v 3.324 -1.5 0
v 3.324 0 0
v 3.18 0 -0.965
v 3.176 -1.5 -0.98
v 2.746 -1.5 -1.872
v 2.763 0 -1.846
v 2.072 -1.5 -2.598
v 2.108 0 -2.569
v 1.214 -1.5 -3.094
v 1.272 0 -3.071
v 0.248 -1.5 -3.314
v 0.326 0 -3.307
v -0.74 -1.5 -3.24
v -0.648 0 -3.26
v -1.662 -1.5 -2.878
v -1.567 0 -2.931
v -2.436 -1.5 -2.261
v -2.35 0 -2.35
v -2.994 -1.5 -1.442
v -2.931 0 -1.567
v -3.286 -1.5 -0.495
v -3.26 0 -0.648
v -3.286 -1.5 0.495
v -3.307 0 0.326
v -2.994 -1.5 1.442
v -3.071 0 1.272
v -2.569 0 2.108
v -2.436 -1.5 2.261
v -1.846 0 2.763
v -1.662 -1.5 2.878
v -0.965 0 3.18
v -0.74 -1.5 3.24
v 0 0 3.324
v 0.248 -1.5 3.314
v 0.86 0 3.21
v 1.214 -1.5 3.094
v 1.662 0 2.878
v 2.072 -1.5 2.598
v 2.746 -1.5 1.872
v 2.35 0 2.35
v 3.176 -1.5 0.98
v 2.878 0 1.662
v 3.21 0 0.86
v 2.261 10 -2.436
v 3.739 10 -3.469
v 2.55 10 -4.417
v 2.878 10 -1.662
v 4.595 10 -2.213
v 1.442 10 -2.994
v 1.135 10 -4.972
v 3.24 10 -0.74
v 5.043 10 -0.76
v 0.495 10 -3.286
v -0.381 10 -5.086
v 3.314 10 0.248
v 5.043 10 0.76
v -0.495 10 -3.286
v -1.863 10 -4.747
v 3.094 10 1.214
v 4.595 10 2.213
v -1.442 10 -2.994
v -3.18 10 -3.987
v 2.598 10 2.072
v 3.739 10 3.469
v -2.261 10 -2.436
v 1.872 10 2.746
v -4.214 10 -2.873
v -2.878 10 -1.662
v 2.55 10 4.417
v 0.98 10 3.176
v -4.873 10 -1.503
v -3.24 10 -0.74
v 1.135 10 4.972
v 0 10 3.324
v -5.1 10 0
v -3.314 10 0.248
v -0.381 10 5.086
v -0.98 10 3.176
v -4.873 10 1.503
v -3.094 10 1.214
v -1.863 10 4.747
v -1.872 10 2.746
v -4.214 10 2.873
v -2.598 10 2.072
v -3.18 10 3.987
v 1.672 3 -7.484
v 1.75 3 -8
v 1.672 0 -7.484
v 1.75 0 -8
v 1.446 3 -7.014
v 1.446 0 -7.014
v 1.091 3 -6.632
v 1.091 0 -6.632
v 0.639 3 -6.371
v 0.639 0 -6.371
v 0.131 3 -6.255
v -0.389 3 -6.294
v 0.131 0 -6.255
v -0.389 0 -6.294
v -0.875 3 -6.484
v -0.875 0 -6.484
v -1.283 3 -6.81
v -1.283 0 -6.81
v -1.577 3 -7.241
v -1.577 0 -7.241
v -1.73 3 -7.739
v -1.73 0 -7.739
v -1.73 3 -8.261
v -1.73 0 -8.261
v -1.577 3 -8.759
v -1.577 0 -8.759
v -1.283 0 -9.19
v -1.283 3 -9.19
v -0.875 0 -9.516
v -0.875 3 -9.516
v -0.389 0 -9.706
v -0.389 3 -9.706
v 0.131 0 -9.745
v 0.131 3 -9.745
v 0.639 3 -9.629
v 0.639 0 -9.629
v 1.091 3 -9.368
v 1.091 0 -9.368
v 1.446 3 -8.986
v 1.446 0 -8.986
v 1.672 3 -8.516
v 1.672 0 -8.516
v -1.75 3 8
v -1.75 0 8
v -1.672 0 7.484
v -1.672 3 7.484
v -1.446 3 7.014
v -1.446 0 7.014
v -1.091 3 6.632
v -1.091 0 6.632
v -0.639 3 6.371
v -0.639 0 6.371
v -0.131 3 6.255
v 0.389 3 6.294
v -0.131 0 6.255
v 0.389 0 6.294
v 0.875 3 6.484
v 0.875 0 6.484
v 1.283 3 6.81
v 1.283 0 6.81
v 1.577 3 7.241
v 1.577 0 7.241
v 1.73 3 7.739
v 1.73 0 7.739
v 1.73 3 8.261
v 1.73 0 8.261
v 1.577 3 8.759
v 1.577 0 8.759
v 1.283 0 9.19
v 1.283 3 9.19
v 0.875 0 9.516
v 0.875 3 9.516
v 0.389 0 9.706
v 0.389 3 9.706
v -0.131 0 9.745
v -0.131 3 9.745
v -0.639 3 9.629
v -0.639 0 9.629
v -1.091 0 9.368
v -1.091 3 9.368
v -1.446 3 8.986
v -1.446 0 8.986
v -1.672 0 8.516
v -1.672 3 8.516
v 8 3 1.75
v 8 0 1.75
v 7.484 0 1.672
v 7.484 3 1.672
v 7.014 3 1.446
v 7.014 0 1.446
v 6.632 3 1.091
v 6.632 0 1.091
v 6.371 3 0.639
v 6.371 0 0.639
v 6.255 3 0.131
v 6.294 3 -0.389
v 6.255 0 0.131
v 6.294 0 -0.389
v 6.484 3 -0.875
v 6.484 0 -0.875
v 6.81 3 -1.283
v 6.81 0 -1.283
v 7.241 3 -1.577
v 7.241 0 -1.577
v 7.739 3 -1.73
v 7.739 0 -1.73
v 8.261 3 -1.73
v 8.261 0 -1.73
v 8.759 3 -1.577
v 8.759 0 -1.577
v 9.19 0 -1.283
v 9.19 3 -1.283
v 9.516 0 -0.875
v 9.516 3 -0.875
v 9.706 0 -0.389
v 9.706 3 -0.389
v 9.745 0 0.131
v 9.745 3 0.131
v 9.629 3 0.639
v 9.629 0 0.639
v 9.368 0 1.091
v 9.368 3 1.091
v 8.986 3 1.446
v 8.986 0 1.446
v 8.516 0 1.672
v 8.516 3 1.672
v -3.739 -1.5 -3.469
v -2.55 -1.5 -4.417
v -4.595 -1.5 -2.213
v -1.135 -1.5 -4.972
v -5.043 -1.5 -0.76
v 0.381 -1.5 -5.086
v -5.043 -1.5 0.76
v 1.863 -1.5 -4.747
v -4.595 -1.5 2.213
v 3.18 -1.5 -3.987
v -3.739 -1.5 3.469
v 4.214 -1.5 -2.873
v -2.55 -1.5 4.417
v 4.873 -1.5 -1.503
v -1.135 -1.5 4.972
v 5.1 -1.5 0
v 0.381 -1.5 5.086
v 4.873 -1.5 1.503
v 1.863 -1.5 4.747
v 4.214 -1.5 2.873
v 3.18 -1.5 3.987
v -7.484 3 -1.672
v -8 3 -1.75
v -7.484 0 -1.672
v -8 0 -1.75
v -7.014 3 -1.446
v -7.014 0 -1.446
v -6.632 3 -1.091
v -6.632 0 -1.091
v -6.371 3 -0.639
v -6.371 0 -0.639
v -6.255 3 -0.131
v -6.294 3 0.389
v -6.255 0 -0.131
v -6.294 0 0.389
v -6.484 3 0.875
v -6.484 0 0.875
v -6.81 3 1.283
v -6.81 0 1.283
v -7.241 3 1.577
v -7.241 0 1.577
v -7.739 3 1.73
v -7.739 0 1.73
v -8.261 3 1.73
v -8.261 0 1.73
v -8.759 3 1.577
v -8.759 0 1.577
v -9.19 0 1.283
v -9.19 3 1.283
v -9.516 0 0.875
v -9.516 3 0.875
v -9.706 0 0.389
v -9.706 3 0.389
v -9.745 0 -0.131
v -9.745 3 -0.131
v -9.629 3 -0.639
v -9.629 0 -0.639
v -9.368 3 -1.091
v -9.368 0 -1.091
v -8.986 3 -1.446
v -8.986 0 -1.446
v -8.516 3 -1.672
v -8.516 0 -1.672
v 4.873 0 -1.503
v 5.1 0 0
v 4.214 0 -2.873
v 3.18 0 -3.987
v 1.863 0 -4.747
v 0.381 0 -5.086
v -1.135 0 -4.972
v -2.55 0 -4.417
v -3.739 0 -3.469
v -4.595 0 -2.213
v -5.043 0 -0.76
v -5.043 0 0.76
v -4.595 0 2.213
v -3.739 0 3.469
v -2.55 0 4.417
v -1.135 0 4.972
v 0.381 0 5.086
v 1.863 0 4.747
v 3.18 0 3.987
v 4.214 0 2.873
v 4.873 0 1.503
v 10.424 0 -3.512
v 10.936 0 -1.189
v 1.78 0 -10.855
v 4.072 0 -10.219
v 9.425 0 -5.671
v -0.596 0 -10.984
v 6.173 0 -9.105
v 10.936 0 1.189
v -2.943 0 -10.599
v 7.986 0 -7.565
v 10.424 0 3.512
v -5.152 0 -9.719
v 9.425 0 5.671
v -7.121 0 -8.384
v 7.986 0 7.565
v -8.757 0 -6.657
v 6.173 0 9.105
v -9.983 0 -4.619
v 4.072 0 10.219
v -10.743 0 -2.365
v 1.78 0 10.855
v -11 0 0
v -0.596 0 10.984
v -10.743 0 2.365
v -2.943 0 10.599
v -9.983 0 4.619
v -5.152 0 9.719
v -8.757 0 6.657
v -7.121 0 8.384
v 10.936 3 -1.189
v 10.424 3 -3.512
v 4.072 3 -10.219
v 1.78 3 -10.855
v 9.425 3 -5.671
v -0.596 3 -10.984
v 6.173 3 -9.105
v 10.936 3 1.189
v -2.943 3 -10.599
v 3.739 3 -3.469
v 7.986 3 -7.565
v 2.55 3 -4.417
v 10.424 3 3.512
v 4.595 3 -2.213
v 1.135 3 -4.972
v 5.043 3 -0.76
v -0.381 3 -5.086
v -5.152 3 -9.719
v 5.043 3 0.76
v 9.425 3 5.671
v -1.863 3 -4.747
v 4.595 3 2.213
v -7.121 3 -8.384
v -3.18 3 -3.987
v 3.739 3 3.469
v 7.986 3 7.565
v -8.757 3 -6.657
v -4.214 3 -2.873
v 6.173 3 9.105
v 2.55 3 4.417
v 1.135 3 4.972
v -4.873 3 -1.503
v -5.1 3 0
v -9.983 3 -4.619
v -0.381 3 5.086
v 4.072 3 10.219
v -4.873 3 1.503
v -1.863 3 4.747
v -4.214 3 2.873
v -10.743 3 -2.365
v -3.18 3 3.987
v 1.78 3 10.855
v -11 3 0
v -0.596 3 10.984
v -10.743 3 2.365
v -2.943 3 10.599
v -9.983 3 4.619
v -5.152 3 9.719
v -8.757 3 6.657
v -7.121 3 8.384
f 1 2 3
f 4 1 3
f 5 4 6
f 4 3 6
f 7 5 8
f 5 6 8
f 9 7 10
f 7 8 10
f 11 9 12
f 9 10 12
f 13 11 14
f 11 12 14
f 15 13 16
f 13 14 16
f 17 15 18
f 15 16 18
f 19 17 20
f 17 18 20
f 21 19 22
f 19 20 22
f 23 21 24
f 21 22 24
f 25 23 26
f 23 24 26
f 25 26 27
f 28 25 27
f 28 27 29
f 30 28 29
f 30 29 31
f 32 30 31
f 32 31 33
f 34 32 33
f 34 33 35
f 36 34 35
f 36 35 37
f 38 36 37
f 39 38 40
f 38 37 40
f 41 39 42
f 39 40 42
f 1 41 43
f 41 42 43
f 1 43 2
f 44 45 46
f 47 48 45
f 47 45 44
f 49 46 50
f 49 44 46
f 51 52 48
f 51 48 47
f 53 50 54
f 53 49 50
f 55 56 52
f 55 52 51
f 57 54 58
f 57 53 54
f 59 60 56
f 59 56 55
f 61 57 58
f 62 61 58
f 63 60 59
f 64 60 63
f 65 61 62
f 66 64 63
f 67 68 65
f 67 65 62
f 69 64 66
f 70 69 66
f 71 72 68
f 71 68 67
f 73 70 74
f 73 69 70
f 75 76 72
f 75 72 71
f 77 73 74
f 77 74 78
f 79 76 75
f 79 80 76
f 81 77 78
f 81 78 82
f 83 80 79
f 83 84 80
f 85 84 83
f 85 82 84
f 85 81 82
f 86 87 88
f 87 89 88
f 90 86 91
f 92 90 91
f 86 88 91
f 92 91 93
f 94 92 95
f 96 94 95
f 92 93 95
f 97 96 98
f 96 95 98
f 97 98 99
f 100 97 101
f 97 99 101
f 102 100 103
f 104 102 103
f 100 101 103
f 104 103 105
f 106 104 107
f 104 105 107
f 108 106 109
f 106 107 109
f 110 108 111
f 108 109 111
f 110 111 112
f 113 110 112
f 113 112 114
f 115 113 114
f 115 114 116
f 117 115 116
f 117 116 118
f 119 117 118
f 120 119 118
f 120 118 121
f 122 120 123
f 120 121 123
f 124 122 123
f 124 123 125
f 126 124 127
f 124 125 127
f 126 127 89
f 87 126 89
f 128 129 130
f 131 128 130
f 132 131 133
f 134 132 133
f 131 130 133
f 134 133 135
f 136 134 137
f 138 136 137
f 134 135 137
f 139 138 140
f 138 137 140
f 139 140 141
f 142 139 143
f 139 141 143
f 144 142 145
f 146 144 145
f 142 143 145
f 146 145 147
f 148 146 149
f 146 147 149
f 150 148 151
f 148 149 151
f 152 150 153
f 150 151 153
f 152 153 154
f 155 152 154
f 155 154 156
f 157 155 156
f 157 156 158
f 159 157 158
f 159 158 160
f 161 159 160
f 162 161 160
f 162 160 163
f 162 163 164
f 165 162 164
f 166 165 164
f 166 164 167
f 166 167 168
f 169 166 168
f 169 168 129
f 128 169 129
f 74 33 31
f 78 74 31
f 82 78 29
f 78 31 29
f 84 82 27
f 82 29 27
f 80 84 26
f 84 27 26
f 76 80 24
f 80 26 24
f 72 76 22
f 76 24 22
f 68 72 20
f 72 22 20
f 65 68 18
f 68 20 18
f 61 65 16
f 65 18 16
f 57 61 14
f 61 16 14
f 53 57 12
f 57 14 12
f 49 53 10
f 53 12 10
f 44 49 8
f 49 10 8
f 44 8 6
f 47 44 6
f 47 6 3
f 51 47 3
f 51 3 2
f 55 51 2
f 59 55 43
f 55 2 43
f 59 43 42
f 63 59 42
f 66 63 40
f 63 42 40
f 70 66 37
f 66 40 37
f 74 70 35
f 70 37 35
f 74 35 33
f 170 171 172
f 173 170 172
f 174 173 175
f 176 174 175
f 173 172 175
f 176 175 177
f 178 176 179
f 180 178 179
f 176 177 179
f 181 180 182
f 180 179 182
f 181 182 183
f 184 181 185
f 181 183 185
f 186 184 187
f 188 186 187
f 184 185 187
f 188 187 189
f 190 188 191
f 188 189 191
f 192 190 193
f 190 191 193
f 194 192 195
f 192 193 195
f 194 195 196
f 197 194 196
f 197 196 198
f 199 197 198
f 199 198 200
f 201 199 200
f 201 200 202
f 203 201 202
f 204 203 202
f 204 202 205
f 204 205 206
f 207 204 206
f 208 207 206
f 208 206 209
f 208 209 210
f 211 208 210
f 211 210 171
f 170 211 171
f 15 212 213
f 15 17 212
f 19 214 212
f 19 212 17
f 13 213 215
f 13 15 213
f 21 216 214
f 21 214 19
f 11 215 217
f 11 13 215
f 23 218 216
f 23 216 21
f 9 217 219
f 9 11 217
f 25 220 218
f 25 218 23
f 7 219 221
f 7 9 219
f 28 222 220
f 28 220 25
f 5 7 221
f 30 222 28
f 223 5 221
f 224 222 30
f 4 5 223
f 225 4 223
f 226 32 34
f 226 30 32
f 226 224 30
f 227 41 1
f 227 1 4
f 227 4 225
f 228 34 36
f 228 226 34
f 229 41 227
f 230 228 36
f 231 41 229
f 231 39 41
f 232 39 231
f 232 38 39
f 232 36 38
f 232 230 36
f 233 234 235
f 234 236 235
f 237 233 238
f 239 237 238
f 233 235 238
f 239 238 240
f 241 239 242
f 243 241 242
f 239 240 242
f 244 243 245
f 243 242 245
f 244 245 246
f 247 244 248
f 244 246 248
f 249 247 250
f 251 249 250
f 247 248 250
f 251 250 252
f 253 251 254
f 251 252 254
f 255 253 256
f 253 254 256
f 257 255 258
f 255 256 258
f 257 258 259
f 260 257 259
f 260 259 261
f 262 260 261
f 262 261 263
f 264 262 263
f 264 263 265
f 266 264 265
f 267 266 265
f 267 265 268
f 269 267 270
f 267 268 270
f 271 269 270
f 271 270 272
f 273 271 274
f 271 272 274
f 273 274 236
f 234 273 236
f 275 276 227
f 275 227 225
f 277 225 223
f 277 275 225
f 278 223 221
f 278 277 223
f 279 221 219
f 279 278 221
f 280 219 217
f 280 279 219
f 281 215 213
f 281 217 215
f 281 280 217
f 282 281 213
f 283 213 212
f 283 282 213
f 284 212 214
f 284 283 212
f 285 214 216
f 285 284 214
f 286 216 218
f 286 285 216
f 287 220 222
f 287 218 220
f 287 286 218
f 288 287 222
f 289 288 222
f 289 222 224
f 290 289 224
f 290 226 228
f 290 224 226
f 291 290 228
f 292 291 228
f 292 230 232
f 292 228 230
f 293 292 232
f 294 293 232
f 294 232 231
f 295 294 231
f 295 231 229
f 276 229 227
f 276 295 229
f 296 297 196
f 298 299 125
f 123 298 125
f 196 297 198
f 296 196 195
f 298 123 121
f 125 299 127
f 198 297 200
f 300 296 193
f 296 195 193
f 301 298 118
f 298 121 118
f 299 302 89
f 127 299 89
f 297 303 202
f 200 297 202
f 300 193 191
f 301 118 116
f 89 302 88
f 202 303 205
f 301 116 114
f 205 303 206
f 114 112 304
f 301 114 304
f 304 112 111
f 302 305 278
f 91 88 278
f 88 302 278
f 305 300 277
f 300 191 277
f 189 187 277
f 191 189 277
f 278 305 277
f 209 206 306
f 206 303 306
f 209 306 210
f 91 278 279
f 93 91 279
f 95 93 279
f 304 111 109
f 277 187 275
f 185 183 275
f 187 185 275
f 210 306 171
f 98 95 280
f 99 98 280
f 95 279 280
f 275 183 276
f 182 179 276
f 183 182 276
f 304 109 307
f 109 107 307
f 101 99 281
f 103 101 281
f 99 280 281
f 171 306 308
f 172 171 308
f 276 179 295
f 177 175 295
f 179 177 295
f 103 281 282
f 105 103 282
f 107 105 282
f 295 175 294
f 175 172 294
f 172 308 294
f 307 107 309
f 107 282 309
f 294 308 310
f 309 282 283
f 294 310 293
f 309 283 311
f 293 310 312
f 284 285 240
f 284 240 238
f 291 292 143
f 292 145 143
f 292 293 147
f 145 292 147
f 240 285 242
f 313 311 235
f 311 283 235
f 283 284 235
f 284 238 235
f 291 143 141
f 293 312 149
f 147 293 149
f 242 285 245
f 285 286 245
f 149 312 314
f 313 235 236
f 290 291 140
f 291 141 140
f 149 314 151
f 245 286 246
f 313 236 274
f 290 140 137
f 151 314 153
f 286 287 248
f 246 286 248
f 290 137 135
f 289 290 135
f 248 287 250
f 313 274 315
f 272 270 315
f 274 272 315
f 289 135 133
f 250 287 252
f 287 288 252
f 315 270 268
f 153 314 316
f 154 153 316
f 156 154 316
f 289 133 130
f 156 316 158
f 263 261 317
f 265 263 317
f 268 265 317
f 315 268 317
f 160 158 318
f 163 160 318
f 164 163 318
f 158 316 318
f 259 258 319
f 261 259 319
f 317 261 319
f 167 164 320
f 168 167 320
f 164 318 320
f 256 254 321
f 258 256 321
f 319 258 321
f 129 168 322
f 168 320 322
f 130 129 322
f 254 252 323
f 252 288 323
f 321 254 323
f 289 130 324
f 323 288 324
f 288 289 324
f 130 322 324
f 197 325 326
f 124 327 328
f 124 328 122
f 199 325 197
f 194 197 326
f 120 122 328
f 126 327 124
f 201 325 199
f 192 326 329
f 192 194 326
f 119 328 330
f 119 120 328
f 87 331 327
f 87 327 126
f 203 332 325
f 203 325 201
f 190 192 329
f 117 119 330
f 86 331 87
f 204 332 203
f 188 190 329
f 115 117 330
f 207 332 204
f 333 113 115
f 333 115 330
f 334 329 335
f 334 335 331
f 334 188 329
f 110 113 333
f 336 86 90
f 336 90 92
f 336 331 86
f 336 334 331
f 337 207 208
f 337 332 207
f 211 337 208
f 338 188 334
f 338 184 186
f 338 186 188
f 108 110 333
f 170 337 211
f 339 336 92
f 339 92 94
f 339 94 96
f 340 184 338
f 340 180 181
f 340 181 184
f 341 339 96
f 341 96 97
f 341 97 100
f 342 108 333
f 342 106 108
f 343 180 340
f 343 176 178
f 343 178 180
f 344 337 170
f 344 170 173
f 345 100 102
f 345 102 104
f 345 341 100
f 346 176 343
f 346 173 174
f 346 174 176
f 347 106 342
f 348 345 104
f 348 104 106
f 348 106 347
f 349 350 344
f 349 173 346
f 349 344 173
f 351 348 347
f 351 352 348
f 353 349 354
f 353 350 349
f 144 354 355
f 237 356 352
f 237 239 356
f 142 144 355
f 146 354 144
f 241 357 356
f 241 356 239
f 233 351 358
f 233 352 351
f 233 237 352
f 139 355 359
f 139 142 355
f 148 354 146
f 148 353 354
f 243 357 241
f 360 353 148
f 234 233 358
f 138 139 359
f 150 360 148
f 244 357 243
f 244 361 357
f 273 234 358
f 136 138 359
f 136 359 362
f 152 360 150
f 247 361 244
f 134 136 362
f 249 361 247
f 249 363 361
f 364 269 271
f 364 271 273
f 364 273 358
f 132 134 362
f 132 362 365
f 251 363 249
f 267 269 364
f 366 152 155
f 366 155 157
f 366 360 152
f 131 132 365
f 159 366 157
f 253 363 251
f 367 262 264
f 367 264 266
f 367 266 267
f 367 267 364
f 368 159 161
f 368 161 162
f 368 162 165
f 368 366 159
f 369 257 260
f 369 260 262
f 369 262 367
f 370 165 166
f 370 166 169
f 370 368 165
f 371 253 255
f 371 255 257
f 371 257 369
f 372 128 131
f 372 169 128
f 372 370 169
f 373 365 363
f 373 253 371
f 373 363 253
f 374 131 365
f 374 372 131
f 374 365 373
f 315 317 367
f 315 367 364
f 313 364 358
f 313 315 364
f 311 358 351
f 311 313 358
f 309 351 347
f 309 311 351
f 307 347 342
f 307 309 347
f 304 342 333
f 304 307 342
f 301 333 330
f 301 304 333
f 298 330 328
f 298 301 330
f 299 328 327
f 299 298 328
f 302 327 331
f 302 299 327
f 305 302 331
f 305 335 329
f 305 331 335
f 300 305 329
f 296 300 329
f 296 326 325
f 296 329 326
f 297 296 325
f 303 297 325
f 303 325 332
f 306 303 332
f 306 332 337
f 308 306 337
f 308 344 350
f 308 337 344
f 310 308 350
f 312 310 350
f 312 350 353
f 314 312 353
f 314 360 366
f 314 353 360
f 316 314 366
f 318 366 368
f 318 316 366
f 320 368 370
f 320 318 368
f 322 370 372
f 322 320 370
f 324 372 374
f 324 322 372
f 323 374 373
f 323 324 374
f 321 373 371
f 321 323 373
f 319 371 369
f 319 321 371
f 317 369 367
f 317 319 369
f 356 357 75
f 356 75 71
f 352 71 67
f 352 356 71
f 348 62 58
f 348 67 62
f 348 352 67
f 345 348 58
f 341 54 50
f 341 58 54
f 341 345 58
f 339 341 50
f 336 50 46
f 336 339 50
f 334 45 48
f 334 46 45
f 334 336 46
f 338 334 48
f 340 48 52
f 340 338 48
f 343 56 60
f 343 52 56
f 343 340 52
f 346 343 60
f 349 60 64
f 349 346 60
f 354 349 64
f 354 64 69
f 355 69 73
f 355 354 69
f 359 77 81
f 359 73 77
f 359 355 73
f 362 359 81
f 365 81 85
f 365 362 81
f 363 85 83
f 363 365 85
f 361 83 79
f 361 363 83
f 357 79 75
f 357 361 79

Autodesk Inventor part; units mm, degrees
ref_plane "YZ Plane" through (0, 0, 0) normal (1, 0, 0) x (0, 1, 0)
ref_plane "XZ Plane" through (0, 0, 0) normal (0, 1, 0) x (-1, 0, 0)
ref_plane "XY Plane" through (0, 0, 0) normal (0, 0, 1) x (1, 0, 0)
sketch "Sketch1" plane through (0, 0, 0) normal (0, 1, 0) x (-1, 0, 0)
  circle A0 centre (0, 0) radius 11
  circle A1 centre (0, 0) radius 5.1
  dimension "d0" = 22
  dimension "d1" = 10.2
extrude "Extrusion1" add sketch "Sketch1" along normal blind 3
extrude "Extrusion2" add sketch "Sketch1" along normal blind 10 contours A1
sketch "Sketch2" plane through (0, 10, 0) normal (0, 1, 0) x (1, 0, 0)
  circle A0 centre (0, 0) radius 5.1 projected
hole "Hole1" at (0, 10, 0) direction (0, -1, 0) diameter 6.647 end through all thread size "M8x1.25" class "6H" standard "ISO Metric profile"
sketch "Sketch3" plane through (0, 0, 0) normal (0, -1, 0) x (1, 0, 0)
  circle A0 centre (0, 0) radius 5.1
  circle A1 centre (0, 0) radius 3.3235 projected
  dimension "d13" = 10.2
extrude "Extrusion3" add sketch "Sketch3" along normal blind 1.5
sketch "Sketch4" plane through (0, 3, 0) normal (0, 1, 0) x (1, 0, 0)
  point P0 (0, 0)
  point P1 (8, 0)
  dimension "d16" = 8
hole "Hole2" at (8, 3, 0) direction (0, -1, 0) diameter 3.5 end through all
pattern_circular "Circular Pattern1" count 4 over 360 about axis through (0, -22.6803, 0) along (0, 1, 0) of "Hole2"
properties part number "DAI_OC"
